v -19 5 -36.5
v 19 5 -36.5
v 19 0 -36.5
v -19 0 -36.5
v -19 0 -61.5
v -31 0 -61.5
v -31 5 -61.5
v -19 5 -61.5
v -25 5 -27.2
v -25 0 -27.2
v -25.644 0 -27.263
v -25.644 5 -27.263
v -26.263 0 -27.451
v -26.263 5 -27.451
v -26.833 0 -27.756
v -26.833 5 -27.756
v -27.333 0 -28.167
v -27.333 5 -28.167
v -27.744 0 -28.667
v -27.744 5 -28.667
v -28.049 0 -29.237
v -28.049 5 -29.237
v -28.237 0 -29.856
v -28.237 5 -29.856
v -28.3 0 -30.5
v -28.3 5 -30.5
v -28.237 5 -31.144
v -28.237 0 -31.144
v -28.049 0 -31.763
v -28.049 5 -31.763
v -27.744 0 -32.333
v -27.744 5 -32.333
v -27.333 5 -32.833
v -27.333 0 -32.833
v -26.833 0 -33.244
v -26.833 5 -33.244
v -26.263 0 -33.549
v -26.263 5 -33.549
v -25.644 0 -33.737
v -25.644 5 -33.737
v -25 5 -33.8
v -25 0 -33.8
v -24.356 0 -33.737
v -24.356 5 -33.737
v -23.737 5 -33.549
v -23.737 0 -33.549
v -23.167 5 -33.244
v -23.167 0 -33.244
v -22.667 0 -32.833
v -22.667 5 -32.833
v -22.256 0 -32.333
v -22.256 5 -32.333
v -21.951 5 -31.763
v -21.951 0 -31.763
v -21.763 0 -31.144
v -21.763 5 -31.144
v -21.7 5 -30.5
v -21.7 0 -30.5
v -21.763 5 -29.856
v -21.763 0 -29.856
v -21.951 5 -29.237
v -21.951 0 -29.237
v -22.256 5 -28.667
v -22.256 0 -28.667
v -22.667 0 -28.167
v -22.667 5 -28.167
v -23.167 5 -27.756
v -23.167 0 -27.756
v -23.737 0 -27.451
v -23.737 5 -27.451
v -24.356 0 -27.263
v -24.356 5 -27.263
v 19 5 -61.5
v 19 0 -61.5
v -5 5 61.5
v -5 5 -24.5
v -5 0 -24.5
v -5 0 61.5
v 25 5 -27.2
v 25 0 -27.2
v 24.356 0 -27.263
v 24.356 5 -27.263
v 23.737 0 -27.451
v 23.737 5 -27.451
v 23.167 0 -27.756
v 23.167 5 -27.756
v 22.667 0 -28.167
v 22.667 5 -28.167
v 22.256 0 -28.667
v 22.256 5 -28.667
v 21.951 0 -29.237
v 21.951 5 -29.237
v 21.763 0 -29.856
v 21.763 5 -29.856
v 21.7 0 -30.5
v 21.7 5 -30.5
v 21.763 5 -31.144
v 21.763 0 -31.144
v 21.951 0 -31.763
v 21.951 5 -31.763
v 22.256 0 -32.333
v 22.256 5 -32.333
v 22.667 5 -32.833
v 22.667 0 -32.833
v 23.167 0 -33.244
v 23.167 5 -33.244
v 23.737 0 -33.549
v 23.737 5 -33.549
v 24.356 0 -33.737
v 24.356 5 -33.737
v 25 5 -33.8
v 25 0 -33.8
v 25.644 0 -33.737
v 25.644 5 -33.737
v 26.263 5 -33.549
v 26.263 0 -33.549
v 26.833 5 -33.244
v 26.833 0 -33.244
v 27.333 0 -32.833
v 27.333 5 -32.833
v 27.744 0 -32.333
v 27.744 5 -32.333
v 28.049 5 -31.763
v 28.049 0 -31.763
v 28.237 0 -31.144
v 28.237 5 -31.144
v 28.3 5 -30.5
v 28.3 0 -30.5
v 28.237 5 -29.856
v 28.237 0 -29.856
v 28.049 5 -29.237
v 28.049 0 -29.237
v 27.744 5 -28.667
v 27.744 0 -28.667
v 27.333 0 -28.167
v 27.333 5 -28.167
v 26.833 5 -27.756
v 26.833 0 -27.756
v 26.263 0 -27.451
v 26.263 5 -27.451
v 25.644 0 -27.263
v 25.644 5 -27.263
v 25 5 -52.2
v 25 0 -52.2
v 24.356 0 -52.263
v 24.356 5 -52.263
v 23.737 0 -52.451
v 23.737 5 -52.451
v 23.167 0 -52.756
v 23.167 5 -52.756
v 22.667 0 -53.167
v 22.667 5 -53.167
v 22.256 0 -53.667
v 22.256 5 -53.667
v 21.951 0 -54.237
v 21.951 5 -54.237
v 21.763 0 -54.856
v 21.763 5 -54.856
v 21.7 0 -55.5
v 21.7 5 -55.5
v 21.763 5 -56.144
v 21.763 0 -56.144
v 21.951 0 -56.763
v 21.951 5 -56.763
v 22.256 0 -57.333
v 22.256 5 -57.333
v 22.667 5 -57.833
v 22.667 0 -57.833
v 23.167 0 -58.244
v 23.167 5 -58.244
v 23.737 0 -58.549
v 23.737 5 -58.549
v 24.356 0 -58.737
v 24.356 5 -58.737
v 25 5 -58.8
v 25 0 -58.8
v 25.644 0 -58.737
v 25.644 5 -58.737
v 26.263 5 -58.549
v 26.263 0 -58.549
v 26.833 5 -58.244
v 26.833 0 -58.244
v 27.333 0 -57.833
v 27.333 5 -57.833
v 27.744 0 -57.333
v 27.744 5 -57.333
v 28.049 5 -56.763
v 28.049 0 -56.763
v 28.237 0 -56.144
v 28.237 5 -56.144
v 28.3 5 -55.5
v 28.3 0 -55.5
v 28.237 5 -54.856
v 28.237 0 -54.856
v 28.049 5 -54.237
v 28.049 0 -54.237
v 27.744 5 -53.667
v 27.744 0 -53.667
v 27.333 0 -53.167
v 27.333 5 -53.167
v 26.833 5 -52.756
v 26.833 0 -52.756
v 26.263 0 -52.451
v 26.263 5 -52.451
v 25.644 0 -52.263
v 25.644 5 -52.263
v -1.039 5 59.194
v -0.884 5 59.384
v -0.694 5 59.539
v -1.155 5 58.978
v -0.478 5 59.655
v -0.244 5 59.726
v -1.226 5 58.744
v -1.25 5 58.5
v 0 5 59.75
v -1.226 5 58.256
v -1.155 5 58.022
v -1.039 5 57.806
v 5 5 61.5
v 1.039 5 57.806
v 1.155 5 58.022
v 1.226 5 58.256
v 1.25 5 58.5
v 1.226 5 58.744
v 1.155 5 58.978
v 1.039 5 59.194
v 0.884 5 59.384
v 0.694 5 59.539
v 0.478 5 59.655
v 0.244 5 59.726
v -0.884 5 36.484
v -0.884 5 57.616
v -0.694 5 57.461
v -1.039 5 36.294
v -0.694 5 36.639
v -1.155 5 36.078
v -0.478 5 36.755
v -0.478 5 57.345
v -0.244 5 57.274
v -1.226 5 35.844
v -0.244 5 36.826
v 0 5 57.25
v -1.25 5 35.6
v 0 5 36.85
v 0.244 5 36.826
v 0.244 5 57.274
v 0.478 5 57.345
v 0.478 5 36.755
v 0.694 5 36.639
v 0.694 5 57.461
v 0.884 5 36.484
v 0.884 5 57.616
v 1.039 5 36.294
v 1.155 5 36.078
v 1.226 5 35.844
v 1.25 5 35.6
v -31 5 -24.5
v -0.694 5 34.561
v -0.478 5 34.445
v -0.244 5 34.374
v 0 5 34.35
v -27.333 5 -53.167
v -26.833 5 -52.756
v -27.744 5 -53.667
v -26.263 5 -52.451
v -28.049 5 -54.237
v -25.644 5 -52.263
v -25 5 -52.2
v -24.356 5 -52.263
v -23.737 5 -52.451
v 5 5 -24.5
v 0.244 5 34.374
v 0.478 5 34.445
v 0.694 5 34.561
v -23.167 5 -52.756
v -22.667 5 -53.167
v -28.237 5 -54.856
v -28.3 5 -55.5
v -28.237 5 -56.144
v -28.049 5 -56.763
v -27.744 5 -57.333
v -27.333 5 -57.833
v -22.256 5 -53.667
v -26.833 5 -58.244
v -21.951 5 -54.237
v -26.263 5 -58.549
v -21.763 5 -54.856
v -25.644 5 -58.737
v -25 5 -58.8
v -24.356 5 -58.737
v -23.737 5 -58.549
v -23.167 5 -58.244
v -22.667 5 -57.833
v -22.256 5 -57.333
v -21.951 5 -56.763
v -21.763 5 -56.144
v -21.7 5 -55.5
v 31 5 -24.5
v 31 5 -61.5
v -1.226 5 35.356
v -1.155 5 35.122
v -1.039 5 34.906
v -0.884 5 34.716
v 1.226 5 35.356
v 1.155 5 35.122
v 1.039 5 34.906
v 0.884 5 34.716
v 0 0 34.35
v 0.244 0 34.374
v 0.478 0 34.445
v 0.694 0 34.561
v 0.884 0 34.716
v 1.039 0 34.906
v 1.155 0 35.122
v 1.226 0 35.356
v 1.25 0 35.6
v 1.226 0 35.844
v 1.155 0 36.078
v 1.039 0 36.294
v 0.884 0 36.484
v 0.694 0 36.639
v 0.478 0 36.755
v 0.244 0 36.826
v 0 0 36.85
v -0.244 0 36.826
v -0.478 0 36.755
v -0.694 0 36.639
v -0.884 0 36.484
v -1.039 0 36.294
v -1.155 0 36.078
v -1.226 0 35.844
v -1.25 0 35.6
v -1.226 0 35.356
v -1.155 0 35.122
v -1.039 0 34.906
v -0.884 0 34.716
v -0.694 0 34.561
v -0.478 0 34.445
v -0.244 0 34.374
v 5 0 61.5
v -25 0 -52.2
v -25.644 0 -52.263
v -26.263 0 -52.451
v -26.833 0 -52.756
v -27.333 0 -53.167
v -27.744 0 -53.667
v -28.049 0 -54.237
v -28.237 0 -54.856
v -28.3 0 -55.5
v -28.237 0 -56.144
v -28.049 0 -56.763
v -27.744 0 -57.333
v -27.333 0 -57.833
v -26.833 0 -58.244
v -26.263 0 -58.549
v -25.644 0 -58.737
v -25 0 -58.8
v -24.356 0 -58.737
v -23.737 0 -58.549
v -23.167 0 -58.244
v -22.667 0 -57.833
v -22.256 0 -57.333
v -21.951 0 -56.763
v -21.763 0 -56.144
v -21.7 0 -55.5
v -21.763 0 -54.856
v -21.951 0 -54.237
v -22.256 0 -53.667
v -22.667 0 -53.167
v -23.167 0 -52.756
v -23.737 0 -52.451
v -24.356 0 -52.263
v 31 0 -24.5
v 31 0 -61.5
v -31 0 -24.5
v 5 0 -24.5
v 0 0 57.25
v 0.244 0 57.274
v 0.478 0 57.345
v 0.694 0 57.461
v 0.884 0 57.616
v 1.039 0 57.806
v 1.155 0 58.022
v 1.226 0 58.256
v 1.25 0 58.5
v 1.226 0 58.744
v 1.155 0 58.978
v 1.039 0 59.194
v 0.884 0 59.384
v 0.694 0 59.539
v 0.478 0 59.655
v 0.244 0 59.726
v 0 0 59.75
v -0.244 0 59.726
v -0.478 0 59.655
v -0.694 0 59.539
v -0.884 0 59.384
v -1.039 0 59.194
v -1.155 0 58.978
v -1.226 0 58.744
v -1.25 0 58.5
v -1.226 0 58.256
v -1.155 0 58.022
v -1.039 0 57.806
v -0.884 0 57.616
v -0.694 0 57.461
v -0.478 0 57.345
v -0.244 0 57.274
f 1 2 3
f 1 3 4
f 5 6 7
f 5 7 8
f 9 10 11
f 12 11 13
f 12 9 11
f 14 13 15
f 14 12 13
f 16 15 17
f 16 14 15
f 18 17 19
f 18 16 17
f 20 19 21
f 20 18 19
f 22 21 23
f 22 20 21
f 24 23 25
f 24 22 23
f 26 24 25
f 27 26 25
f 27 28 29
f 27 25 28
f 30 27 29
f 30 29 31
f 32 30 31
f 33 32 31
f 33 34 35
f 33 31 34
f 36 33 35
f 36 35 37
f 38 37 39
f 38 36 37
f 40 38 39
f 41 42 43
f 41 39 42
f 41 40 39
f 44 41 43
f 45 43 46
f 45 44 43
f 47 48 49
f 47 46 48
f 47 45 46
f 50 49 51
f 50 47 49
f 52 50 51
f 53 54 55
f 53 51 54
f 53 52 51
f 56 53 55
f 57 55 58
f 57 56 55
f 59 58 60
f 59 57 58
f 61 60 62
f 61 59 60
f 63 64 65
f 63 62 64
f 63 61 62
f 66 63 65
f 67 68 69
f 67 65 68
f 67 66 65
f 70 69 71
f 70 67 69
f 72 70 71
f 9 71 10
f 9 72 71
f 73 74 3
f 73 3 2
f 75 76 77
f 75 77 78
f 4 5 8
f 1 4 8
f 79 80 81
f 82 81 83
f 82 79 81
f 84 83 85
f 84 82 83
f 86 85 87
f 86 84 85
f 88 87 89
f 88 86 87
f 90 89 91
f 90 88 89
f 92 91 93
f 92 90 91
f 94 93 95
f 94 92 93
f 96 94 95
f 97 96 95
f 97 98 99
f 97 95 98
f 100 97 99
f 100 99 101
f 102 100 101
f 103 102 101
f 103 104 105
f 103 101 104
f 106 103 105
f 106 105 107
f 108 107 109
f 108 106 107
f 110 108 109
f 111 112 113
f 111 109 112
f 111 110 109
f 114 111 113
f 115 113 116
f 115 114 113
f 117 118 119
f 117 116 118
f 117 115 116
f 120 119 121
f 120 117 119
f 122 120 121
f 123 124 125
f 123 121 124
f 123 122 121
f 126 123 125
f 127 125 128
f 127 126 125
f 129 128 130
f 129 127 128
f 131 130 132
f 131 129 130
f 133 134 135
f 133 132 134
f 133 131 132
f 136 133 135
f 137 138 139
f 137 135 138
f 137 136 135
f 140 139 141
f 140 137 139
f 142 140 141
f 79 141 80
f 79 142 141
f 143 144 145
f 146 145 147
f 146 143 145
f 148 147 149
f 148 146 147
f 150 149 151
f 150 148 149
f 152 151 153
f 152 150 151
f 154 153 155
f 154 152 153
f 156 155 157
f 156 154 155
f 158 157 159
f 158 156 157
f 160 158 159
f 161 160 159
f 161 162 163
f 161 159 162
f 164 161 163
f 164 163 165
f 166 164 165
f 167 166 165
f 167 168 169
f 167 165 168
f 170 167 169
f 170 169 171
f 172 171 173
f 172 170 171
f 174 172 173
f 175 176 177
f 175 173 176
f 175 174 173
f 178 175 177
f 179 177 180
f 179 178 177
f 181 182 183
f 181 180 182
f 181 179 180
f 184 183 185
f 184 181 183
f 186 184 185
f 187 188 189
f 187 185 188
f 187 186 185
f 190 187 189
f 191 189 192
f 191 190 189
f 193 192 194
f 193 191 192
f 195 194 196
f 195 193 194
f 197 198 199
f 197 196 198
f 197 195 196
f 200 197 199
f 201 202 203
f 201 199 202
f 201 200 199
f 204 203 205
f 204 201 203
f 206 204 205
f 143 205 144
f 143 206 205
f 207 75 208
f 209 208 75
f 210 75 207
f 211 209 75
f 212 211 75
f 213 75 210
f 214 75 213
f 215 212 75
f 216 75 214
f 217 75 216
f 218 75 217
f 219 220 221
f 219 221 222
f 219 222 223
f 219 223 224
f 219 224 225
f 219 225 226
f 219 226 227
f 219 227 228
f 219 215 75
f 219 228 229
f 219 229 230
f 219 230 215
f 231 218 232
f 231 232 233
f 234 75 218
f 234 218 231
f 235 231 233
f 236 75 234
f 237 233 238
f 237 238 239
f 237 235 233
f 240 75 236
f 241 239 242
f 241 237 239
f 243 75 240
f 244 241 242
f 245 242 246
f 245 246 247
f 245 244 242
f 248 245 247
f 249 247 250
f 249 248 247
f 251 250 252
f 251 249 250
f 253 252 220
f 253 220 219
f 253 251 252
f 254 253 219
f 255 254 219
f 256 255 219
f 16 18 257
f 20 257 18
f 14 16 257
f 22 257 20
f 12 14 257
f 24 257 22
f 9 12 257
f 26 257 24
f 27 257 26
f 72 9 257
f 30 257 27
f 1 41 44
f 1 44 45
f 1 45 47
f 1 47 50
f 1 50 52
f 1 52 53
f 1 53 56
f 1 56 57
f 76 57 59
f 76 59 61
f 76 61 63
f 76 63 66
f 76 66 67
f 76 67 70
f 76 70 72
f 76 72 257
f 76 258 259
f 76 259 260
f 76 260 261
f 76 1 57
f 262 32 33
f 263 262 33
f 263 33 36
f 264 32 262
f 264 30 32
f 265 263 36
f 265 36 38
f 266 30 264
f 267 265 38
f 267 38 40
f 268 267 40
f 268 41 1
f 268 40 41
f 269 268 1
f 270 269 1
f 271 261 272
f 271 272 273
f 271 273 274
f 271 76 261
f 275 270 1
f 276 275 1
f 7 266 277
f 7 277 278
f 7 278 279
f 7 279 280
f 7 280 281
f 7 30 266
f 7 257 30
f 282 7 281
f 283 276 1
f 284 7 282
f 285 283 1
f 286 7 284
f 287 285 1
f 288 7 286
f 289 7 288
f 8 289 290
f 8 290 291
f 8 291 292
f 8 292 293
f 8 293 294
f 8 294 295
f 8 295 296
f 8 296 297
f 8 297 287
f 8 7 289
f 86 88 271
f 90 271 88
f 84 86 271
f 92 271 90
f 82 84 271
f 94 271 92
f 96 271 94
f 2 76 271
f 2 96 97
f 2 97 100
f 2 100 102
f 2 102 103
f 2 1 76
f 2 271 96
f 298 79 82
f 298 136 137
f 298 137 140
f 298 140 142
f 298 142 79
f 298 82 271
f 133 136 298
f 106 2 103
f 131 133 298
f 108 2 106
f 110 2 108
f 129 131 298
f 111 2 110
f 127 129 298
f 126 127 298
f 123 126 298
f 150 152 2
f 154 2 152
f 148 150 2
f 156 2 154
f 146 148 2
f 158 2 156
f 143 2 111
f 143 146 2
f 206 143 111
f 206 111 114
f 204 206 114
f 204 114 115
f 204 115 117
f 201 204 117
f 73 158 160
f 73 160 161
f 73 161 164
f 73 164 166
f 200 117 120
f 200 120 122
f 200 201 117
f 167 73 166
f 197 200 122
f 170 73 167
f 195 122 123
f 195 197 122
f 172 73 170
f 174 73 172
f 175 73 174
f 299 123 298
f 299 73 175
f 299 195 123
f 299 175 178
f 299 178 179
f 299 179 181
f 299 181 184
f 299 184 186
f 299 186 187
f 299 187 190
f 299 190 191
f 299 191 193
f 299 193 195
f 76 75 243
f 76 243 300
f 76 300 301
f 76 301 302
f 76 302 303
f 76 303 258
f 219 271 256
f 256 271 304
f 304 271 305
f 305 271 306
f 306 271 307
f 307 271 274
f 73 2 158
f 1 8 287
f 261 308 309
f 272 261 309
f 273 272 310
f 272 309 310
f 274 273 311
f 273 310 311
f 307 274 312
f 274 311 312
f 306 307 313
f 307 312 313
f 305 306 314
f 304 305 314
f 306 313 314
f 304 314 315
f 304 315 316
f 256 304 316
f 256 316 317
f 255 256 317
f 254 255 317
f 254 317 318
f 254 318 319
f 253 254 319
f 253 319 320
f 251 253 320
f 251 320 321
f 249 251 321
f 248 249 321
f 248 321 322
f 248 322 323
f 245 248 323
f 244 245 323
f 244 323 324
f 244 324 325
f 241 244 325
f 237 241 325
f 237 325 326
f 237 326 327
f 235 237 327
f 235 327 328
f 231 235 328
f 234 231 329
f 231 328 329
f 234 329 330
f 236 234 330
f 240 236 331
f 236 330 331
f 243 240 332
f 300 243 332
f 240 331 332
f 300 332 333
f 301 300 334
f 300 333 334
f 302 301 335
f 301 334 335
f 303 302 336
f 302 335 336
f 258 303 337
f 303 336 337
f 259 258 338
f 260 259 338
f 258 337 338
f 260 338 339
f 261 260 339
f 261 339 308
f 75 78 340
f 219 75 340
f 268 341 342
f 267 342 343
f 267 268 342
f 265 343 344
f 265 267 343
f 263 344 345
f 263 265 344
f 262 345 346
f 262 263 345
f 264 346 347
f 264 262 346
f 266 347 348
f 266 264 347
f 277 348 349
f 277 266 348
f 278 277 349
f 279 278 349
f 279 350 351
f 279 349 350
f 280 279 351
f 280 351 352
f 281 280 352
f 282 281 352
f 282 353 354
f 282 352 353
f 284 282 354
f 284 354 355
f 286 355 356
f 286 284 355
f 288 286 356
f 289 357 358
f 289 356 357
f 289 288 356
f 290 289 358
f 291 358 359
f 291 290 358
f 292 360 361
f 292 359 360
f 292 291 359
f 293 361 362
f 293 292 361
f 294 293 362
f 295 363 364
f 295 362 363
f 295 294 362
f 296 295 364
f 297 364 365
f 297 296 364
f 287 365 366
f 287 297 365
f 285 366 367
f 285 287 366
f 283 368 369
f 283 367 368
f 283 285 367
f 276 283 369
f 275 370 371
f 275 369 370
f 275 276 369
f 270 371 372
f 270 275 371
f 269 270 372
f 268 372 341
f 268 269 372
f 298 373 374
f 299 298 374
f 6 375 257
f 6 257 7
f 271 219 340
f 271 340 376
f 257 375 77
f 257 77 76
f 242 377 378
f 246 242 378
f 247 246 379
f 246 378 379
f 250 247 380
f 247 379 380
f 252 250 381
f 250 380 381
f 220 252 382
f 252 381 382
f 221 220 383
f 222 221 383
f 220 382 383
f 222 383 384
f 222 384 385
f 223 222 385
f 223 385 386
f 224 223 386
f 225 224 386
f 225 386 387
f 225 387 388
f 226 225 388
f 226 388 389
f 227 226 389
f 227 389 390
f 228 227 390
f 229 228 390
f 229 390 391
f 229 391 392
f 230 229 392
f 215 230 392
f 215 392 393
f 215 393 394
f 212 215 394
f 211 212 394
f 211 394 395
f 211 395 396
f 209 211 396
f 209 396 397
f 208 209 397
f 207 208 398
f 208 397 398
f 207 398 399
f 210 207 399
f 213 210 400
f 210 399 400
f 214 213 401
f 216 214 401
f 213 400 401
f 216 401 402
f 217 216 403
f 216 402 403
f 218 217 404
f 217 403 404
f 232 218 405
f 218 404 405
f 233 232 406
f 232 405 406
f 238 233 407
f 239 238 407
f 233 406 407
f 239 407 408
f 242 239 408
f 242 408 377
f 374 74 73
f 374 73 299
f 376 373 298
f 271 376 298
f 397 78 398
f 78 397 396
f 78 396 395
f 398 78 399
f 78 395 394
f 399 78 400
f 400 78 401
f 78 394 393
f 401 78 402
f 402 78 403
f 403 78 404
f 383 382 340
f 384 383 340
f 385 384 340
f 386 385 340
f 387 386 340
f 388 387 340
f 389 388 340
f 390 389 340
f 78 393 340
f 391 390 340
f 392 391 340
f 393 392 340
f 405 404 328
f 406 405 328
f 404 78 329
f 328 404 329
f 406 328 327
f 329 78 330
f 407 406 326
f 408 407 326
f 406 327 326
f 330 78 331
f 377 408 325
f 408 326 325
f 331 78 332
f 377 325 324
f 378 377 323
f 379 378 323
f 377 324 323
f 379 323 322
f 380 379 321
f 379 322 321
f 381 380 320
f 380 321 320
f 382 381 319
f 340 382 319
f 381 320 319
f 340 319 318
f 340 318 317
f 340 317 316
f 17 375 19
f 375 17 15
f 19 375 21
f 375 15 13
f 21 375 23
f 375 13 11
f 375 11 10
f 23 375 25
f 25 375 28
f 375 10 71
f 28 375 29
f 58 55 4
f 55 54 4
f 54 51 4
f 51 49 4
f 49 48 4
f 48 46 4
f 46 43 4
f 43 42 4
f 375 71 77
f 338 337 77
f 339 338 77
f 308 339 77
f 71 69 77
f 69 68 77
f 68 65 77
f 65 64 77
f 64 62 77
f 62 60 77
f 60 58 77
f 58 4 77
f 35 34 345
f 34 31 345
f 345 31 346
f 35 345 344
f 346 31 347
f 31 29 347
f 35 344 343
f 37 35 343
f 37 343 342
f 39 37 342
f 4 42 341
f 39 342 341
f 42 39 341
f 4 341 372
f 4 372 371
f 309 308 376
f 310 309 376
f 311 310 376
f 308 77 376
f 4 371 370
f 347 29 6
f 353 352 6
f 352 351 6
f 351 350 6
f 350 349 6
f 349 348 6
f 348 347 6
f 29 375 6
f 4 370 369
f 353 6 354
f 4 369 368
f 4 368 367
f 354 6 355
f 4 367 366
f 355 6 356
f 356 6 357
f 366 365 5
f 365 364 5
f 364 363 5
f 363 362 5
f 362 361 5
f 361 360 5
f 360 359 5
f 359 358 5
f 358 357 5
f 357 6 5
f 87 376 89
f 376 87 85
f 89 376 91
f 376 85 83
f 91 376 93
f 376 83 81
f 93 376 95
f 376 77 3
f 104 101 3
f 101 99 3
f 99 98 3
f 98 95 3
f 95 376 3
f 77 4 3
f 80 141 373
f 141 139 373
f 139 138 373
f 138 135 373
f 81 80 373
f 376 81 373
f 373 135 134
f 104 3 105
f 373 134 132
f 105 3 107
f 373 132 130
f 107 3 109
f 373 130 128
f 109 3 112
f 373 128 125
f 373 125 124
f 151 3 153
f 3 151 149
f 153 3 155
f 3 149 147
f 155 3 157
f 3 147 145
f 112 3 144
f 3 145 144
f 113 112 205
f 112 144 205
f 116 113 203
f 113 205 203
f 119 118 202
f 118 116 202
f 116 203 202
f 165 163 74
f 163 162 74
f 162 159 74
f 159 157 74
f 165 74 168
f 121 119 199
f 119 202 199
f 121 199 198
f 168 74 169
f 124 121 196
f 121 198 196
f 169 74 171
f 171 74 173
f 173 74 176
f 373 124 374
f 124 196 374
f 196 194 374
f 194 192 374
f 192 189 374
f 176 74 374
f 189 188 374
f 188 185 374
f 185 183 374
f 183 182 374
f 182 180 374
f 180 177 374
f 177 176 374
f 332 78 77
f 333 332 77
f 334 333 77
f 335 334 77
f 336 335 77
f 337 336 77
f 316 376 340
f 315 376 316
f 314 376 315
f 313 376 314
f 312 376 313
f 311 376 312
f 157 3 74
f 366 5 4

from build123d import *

# Parameters (mm, degrees)
SKETCH1_W             = 62
SKETCH1_H             = 123
EXTRUDE1_DEPTH        = 5
SKETCH2_W             = 38
SKETCH2_H             = 5
EXTRUDE2_DEPTH        = 25
SKETCH3_W             = 86
SKETCH3_H             = 5
EXTRUDE3_DEPTH        = 26
SKETCH4_W             = 86
SKETCH4_H             = 5
EXTRUDE4_DEPTH        = 26
LPATTERN1_COUNT       = 2
LPATTERN1_PITCH       = 25
LPATTERN1_COUNT_DIR2  = 2
LPATTERN1_PITCH_DIR2  = 50
M3X0_5_TAPPED_HOLE1_D = 2.5
LPATTERN2_COUNT       = 2
LPATTERN2_PITCH       = 22.9


with BuildPart() as part:
    # Sketch1 → Extrude1 (new body)
    with BuildSketch(Plane(origin=(0, 0, 0), x_dir=(1, 0, 0), z_dir=(0, 1, 0))):
        Rectangle(SKETCH1_W, SKETCH1_H)
    extrude(amount=EXTRUDE1_DEPTH)

    # Sketch2 → Extrude2 (cut)
    with BuildSketch(Plane(origin=(0, 0, -61.5), x_dir=(-1, 0, 0), z_dir=(0, 0, -1))):
        with Locations((0, 2.5)):
            Rectangle(SKETCH2_W, SKETCH2_H)
    extrude(amount=-EXTRUDE2_DEPTH, mode=Mode.SUBTRACT)

    # Sketch3 → Extrude3 (cut)
    with BuildSketch(Plane.ZY.offset(31)):
        with Locations((18.5, 2.5)):
            Rectangle(SKETCH3_W, SKETCH3_H)
    extrude(amount=-EXTRUDE3_DEPTH, mode=Mode.SUBTRACT)

    # Sketch4 → Extrude4 (cut)
    with BuildSketch(Plane(origin=(31, 0, 0), x_dir=(0, 0, -1), z_dir=(1, 0, 0))):
        with Locations((-18.5, 2.5)):
            Rectangle(SKETCH4_W, SKETCH4_H)
    extrude(amount=-EXTRUDE4_DEPTH, mode=Mode.SUBTRACT)

    # Sketch6 → M6 Clearance Hole1 (revolve, cut)
    with BuildSketch(Plane(origin=(-25, 5, -55.5), x_dir=(0, 0, 1), z_dir=(1, 0, 0))):
        Polygon((0, 0), (0, 11.982840043), (3.3, 10), (3.3, 0), align=None)
    m6_clearance_hole1 = revolve(axis=Axis((-25, 11.35, -55.5), (0, -1, 0)), mode=Mode.SUBTRACT)

    # LPattern1: M6 Clearance Hole1 2 × 2
    with Locations(*[(j * LPATTERN1_PITCH_DIR2, 0, i * LPATTERN1_PITCH) for i in range(LPATTERN1_COUNT) for j in range(LPATTERN1_COUNT_DIR2) if (i, j) != (0, 0)]):
        add(m6_clearance_hole1, mode=Mode.SUBTRACT)

    # M3x0.5 Tapped Hole1 (through all)
    with Locations(Plane(origin=(0, 5, 58.5), x_dir=(0, 0, 1), z_dir=(0, 1, 0))):
        with Locations((0, 0)):
            m3x0_5_tapped_hole1 = Hole(M3X0_5_TAPPED_HOLE1_D / 2)

    # LPattern2: M3x0.5 Tapped Hole1 ×2
    with Locations(*[(0, 0, -i * LPATTERN2_PITCH) for i in range(1, LPATTERN2_COUNT)]):
        add(m3x0_5_tapped_hole1, mode=Mode.SUBTRACT)


solid = part.part
